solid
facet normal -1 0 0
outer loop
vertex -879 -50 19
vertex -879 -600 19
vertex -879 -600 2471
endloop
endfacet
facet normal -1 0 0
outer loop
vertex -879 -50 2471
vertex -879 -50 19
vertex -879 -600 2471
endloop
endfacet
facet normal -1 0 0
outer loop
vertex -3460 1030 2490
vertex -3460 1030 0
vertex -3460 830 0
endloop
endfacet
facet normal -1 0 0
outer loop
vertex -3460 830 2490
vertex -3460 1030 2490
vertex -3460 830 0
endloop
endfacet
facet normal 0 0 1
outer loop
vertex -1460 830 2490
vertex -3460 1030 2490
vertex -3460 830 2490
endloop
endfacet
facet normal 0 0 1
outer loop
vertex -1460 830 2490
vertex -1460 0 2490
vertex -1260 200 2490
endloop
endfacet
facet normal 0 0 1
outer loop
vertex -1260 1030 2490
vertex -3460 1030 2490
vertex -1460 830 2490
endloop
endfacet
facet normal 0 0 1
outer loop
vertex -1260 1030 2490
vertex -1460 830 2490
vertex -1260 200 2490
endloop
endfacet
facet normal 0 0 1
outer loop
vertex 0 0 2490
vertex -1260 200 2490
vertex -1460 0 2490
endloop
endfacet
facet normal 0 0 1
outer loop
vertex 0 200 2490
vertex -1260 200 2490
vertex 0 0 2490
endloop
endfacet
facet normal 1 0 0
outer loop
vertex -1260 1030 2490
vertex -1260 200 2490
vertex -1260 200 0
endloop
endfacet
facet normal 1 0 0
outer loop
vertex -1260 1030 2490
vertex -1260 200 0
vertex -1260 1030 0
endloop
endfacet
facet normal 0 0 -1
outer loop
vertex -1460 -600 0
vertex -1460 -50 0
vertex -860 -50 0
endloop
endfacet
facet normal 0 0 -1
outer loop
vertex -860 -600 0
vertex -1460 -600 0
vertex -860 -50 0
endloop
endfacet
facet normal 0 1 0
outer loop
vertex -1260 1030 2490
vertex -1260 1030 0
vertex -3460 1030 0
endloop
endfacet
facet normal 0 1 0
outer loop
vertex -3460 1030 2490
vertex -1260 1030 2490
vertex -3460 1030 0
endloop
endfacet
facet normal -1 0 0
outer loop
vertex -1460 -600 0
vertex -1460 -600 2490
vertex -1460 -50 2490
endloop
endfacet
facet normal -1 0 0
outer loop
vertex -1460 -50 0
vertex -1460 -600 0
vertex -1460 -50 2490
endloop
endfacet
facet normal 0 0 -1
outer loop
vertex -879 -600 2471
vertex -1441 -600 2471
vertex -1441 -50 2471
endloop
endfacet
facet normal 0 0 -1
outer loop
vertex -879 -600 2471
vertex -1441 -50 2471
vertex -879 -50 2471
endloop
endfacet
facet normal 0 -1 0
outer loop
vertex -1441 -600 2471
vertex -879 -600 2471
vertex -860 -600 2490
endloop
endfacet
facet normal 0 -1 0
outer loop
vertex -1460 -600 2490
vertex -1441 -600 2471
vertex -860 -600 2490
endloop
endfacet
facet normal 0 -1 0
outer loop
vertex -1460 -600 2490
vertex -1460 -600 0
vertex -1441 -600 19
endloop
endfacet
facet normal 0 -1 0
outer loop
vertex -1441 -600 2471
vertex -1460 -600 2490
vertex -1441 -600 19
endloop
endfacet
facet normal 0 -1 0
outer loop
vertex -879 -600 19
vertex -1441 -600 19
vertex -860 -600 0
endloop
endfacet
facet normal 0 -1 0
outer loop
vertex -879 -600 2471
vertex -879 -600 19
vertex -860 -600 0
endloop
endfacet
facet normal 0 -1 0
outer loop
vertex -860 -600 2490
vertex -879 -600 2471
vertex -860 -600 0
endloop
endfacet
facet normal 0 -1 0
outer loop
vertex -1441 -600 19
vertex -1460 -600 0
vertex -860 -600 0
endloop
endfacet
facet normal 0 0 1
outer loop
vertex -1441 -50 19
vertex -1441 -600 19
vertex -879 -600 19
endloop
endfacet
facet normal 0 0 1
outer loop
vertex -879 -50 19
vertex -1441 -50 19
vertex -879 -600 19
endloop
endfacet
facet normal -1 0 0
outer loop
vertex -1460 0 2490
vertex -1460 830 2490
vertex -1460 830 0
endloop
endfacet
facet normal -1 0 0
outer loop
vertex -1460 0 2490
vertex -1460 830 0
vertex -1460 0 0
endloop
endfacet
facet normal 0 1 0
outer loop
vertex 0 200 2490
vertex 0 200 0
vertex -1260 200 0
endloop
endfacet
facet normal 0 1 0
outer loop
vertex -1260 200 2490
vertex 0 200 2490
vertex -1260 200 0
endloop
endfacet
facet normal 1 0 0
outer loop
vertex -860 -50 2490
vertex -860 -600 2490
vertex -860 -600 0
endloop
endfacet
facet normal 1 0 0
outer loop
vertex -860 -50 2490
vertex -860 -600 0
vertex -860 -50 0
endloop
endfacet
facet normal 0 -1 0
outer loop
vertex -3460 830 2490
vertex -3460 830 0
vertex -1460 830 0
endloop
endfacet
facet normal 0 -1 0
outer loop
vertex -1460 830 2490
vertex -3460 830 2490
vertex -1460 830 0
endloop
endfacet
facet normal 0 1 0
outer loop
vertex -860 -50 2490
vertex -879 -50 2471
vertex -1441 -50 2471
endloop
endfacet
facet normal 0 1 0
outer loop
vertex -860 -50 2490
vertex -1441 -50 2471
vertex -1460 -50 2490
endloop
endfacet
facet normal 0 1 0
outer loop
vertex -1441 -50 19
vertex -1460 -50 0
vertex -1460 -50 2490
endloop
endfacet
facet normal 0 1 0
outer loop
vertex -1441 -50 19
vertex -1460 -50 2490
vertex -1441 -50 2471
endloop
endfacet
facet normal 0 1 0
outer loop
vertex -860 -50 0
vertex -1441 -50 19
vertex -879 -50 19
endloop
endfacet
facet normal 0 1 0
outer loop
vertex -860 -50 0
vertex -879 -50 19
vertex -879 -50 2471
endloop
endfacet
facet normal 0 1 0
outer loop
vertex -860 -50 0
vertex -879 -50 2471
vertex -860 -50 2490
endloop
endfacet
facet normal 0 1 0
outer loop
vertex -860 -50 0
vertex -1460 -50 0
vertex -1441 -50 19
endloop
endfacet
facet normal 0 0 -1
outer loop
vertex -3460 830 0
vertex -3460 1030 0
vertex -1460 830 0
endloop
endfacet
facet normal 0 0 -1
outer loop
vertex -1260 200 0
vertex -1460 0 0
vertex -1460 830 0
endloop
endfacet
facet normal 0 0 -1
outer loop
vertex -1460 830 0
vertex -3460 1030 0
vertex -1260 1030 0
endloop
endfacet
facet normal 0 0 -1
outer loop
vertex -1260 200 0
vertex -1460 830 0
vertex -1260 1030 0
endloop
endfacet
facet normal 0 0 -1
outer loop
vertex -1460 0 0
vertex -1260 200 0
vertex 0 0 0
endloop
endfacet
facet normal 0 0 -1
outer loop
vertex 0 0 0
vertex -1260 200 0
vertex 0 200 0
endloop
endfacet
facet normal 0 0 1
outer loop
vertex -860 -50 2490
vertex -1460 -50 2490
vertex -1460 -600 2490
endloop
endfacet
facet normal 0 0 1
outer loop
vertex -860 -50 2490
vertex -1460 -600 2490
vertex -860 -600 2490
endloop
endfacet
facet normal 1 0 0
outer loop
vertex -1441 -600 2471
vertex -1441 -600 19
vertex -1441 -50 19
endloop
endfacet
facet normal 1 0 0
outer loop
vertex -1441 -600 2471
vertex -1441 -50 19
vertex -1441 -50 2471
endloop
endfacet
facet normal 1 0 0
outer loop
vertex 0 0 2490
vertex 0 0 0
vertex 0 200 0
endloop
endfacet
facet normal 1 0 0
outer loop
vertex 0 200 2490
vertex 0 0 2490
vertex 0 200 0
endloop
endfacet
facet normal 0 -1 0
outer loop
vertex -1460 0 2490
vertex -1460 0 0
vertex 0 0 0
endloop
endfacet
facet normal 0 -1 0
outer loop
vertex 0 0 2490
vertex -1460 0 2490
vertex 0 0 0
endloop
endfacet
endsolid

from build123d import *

# Parameters (mm, degrees)
F1_DEPTH = 2490
F2_W     = 600
F2_H     = 550
F3_DEPTH = 2490
F4_W     = 562
F4_H     = 2452
F5_DEPTH = 550


with BuildPart() as f1:
    # F0 (on Top) → F1 (new body)
    with BuildSketch(Plane.XY):
        Polygon((-1460, 0), (0, 0), (0, 200), (-1260, 200), (-1460, 200), align=None)
        Polygon((-1460, 830), (-1460, 200), (-1260, 200), (-1260, 1030), (-3460, 1030), (-3460, 830), align=None)
    extrude(amount=F1_DEPTH)


with BuildPart() as f3:
    # F2 (on Top) → F3 (new body)
    with BuildSketch(Plane.XY):
        with Locations((-1160, -325)):
            Rectangle(F2_W, F2_H)
    extrude(amount=F3_DEPTH)

    # F4 (on face) → F5 (cut, through all)
    with BuildSketch(Plane.XZ.offset(600)):
        with Locations((-1160, 1245)):
            Rectangle(F4_W, F4_H)
    extrude(amount=-F5_DEPTH, mode=Mode.SUBTRACT)


solid = Compound([f1.part, f3.part])
